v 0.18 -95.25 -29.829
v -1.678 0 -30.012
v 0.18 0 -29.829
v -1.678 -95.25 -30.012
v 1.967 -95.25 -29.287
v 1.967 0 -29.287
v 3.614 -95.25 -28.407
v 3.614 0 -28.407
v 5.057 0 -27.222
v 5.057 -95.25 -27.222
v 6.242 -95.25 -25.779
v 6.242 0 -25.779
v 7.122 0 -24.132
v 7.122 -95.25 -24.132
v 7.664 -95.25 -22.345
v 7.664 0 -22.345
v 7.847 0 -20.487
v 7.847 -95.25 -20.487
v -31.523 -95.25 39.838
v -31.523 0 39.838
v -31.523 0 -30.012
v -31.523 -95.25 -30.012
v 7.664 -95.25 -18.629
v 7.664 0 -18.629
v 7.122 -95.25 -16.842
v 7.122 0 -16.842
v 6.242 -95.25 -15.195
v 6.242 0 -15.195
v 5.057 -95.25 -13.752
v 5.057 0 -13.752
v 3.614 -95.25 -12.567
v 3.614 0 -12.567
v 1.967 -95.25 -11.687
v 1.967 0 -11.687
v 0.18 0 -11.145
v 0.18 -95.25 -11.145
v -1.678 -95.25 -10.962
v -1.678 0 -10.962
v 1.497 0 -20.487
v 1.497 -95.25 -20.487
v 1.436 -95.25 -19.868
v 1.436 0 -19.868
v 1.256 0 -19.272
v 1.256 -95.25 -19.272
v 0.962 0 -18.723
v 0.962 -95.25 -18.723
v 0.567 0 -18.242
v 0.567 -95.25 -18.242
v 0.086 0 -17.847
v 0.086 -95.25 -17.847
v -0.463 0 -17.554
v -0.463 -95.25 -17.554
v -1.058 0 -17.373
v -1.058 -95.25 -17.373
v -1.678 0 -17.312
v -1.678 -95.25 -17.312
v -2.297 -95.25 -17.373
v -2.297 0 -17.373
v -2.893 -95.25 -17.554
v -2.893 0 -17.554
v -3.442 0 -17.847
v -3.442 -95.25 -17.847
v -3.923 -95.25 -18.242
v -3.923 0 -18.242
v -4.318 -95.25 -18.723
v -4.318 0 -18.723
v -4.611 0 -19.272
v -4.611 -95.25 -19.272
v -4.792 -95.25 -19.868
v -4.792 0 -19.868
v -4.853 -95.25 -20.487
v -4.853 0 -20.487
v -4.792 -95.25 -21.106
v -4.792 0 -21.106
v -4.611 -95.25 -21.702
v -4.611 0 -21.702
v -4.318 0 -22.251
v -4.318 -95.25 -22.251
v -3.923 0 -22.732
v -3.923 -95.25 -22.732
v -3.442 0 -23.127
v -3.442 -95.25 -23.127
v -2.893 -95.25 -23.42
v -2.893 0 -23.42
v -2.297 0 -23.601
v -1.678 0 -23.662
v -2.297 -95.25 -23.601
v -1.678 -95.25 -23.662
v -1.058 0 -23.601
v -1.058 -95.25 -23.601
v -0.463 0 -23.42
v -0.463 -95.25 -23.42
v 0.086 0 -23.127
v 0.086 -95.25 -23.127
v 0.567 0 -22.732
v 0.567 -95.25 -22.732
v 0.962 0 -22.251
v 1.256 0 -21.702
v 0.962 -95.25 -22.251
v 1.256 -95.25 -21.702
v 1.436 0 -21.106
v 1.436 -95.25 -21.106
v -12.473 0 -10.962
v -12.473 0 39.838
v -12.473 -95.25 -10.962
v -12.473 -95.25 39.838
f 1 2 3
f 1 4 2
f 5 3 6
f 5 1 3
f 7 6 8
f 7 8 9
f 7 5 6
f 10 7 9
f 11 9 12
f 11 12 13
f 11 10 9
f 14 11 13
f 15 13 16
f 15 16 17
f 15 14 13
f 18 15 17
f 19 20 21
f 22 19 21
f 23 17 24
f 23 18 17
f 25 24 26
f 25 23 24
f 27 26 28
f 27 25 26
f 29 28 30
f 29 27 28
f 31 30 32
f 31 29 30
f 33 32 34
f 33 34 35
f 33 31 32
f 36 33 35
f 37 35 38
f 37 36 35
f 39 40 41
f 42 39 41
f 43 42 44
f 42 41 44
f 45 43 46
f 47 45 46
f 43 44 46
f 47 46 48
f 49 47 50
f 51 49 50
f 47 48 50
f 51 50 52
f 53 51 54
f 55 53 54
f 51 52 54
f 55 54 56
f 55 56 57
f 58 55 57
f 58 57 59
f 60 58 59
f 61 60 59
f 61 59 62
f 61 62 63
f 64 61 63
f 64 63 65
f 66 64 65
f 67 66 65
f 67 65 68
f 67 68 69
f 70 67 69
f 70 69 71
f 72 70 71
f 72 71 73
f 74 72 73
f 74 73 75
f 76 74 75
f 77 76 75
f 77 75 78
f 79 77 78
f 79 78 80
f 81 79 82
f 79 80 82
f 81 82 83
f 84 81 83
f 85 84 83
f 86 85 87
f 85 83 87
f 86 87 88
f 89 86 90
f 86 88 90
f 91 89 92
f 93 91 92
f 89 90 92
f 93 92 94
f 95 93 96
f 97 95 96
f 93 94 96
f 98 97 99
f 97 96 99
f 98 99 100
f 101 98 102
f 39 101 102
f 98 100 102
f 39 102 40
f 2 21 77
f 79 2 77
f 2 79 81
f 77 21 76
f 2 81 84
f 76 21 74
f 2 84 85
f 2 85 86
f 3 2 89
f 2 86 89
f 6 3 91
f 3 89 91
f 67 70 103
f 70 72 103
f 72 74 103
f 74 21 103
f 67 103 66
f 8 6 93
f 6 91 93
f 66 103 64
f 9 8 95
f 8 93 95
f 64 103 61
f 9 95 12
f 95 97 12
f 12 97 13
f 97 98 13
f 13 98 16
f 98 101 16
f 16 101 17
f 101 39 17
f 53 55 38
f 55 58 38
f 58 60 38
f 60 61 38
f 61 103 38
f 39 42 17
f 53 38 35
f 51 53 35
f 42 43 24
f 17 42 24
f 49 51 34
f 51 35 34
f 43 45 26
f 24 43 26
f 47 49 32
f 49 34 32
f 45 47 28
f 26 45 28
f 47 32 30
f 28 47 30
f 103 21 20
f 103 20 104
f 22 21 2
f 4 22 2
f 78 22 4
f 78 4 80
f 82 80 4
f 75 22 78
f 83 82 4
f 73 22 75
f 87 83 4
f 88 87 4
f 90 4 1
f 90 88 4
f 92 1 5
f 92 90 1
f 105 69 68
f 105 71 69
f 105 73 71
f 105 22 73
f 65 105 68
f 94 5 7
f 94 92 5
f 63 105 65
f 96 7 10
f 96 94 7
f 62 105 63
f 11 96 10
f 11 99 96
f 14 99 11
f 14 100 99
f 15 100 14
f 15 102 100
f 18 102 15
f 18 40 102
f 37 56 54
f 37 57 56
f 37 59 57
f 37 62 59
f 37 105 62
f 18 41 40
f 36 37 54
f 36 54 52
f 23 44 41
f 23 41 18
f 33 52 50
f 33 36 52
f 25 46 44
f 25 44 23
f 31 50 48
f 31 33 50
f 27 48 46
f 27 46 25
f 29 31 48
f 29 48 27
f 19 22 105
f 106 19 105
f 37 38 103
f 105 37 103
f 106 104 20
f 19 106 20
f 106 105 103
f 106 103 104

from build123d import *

# Parameters (mm, degrees)
F1_DEPTH = 95.25
F2_R     = 9.52499
F3_R     = 3.175
F4_DEPTH = 95.251


# Not quite as in the source:
# - a fillet or chamfer is up to 0.001 mm smaller than in the source, because OpenCascade refuses the exact size
# - a feature names something its author has since deleted; it is built from what else it names


with BuildPart() as f1:
    # F0 (on Front) → F1 (new body)
    with BuildSketch(Plane.XZ):
        Polygon((-12.472799319, 39.8380596402), (-31.522799319, 39.8380596402), (-31.522799319, -30.0119403598), (7.847200681, -30.0119403598), (7.847200681, -10.9619403598), (-12.472799319, -10.9619403598), align=None)
    extrude(amount=F1_DEPTH)

    # F2 (radius 9.525 in the source; OpenCascade refuses exactly that, so slightly less here)
    f2_edges = [f1.edges().sort_by_distance(p)[0] for p in [
        (7.847201, -47.625, -10.96194),
        (7.847201, -47.625, -30.01194),
    ]]
    fillet(f2_edges, radius=F2_R)

    # F3 (on face) → F4 (cut, through all)
    with BuildSketch(Plane.XZ.offset(95.25)):
        with Locations((-1.677799319, -20.4869403598)):
            Circle(F3_R)
    extrude(amount=-F4_DEPTH, mode=Mode.SUBTRACT)


solid = f1.part
